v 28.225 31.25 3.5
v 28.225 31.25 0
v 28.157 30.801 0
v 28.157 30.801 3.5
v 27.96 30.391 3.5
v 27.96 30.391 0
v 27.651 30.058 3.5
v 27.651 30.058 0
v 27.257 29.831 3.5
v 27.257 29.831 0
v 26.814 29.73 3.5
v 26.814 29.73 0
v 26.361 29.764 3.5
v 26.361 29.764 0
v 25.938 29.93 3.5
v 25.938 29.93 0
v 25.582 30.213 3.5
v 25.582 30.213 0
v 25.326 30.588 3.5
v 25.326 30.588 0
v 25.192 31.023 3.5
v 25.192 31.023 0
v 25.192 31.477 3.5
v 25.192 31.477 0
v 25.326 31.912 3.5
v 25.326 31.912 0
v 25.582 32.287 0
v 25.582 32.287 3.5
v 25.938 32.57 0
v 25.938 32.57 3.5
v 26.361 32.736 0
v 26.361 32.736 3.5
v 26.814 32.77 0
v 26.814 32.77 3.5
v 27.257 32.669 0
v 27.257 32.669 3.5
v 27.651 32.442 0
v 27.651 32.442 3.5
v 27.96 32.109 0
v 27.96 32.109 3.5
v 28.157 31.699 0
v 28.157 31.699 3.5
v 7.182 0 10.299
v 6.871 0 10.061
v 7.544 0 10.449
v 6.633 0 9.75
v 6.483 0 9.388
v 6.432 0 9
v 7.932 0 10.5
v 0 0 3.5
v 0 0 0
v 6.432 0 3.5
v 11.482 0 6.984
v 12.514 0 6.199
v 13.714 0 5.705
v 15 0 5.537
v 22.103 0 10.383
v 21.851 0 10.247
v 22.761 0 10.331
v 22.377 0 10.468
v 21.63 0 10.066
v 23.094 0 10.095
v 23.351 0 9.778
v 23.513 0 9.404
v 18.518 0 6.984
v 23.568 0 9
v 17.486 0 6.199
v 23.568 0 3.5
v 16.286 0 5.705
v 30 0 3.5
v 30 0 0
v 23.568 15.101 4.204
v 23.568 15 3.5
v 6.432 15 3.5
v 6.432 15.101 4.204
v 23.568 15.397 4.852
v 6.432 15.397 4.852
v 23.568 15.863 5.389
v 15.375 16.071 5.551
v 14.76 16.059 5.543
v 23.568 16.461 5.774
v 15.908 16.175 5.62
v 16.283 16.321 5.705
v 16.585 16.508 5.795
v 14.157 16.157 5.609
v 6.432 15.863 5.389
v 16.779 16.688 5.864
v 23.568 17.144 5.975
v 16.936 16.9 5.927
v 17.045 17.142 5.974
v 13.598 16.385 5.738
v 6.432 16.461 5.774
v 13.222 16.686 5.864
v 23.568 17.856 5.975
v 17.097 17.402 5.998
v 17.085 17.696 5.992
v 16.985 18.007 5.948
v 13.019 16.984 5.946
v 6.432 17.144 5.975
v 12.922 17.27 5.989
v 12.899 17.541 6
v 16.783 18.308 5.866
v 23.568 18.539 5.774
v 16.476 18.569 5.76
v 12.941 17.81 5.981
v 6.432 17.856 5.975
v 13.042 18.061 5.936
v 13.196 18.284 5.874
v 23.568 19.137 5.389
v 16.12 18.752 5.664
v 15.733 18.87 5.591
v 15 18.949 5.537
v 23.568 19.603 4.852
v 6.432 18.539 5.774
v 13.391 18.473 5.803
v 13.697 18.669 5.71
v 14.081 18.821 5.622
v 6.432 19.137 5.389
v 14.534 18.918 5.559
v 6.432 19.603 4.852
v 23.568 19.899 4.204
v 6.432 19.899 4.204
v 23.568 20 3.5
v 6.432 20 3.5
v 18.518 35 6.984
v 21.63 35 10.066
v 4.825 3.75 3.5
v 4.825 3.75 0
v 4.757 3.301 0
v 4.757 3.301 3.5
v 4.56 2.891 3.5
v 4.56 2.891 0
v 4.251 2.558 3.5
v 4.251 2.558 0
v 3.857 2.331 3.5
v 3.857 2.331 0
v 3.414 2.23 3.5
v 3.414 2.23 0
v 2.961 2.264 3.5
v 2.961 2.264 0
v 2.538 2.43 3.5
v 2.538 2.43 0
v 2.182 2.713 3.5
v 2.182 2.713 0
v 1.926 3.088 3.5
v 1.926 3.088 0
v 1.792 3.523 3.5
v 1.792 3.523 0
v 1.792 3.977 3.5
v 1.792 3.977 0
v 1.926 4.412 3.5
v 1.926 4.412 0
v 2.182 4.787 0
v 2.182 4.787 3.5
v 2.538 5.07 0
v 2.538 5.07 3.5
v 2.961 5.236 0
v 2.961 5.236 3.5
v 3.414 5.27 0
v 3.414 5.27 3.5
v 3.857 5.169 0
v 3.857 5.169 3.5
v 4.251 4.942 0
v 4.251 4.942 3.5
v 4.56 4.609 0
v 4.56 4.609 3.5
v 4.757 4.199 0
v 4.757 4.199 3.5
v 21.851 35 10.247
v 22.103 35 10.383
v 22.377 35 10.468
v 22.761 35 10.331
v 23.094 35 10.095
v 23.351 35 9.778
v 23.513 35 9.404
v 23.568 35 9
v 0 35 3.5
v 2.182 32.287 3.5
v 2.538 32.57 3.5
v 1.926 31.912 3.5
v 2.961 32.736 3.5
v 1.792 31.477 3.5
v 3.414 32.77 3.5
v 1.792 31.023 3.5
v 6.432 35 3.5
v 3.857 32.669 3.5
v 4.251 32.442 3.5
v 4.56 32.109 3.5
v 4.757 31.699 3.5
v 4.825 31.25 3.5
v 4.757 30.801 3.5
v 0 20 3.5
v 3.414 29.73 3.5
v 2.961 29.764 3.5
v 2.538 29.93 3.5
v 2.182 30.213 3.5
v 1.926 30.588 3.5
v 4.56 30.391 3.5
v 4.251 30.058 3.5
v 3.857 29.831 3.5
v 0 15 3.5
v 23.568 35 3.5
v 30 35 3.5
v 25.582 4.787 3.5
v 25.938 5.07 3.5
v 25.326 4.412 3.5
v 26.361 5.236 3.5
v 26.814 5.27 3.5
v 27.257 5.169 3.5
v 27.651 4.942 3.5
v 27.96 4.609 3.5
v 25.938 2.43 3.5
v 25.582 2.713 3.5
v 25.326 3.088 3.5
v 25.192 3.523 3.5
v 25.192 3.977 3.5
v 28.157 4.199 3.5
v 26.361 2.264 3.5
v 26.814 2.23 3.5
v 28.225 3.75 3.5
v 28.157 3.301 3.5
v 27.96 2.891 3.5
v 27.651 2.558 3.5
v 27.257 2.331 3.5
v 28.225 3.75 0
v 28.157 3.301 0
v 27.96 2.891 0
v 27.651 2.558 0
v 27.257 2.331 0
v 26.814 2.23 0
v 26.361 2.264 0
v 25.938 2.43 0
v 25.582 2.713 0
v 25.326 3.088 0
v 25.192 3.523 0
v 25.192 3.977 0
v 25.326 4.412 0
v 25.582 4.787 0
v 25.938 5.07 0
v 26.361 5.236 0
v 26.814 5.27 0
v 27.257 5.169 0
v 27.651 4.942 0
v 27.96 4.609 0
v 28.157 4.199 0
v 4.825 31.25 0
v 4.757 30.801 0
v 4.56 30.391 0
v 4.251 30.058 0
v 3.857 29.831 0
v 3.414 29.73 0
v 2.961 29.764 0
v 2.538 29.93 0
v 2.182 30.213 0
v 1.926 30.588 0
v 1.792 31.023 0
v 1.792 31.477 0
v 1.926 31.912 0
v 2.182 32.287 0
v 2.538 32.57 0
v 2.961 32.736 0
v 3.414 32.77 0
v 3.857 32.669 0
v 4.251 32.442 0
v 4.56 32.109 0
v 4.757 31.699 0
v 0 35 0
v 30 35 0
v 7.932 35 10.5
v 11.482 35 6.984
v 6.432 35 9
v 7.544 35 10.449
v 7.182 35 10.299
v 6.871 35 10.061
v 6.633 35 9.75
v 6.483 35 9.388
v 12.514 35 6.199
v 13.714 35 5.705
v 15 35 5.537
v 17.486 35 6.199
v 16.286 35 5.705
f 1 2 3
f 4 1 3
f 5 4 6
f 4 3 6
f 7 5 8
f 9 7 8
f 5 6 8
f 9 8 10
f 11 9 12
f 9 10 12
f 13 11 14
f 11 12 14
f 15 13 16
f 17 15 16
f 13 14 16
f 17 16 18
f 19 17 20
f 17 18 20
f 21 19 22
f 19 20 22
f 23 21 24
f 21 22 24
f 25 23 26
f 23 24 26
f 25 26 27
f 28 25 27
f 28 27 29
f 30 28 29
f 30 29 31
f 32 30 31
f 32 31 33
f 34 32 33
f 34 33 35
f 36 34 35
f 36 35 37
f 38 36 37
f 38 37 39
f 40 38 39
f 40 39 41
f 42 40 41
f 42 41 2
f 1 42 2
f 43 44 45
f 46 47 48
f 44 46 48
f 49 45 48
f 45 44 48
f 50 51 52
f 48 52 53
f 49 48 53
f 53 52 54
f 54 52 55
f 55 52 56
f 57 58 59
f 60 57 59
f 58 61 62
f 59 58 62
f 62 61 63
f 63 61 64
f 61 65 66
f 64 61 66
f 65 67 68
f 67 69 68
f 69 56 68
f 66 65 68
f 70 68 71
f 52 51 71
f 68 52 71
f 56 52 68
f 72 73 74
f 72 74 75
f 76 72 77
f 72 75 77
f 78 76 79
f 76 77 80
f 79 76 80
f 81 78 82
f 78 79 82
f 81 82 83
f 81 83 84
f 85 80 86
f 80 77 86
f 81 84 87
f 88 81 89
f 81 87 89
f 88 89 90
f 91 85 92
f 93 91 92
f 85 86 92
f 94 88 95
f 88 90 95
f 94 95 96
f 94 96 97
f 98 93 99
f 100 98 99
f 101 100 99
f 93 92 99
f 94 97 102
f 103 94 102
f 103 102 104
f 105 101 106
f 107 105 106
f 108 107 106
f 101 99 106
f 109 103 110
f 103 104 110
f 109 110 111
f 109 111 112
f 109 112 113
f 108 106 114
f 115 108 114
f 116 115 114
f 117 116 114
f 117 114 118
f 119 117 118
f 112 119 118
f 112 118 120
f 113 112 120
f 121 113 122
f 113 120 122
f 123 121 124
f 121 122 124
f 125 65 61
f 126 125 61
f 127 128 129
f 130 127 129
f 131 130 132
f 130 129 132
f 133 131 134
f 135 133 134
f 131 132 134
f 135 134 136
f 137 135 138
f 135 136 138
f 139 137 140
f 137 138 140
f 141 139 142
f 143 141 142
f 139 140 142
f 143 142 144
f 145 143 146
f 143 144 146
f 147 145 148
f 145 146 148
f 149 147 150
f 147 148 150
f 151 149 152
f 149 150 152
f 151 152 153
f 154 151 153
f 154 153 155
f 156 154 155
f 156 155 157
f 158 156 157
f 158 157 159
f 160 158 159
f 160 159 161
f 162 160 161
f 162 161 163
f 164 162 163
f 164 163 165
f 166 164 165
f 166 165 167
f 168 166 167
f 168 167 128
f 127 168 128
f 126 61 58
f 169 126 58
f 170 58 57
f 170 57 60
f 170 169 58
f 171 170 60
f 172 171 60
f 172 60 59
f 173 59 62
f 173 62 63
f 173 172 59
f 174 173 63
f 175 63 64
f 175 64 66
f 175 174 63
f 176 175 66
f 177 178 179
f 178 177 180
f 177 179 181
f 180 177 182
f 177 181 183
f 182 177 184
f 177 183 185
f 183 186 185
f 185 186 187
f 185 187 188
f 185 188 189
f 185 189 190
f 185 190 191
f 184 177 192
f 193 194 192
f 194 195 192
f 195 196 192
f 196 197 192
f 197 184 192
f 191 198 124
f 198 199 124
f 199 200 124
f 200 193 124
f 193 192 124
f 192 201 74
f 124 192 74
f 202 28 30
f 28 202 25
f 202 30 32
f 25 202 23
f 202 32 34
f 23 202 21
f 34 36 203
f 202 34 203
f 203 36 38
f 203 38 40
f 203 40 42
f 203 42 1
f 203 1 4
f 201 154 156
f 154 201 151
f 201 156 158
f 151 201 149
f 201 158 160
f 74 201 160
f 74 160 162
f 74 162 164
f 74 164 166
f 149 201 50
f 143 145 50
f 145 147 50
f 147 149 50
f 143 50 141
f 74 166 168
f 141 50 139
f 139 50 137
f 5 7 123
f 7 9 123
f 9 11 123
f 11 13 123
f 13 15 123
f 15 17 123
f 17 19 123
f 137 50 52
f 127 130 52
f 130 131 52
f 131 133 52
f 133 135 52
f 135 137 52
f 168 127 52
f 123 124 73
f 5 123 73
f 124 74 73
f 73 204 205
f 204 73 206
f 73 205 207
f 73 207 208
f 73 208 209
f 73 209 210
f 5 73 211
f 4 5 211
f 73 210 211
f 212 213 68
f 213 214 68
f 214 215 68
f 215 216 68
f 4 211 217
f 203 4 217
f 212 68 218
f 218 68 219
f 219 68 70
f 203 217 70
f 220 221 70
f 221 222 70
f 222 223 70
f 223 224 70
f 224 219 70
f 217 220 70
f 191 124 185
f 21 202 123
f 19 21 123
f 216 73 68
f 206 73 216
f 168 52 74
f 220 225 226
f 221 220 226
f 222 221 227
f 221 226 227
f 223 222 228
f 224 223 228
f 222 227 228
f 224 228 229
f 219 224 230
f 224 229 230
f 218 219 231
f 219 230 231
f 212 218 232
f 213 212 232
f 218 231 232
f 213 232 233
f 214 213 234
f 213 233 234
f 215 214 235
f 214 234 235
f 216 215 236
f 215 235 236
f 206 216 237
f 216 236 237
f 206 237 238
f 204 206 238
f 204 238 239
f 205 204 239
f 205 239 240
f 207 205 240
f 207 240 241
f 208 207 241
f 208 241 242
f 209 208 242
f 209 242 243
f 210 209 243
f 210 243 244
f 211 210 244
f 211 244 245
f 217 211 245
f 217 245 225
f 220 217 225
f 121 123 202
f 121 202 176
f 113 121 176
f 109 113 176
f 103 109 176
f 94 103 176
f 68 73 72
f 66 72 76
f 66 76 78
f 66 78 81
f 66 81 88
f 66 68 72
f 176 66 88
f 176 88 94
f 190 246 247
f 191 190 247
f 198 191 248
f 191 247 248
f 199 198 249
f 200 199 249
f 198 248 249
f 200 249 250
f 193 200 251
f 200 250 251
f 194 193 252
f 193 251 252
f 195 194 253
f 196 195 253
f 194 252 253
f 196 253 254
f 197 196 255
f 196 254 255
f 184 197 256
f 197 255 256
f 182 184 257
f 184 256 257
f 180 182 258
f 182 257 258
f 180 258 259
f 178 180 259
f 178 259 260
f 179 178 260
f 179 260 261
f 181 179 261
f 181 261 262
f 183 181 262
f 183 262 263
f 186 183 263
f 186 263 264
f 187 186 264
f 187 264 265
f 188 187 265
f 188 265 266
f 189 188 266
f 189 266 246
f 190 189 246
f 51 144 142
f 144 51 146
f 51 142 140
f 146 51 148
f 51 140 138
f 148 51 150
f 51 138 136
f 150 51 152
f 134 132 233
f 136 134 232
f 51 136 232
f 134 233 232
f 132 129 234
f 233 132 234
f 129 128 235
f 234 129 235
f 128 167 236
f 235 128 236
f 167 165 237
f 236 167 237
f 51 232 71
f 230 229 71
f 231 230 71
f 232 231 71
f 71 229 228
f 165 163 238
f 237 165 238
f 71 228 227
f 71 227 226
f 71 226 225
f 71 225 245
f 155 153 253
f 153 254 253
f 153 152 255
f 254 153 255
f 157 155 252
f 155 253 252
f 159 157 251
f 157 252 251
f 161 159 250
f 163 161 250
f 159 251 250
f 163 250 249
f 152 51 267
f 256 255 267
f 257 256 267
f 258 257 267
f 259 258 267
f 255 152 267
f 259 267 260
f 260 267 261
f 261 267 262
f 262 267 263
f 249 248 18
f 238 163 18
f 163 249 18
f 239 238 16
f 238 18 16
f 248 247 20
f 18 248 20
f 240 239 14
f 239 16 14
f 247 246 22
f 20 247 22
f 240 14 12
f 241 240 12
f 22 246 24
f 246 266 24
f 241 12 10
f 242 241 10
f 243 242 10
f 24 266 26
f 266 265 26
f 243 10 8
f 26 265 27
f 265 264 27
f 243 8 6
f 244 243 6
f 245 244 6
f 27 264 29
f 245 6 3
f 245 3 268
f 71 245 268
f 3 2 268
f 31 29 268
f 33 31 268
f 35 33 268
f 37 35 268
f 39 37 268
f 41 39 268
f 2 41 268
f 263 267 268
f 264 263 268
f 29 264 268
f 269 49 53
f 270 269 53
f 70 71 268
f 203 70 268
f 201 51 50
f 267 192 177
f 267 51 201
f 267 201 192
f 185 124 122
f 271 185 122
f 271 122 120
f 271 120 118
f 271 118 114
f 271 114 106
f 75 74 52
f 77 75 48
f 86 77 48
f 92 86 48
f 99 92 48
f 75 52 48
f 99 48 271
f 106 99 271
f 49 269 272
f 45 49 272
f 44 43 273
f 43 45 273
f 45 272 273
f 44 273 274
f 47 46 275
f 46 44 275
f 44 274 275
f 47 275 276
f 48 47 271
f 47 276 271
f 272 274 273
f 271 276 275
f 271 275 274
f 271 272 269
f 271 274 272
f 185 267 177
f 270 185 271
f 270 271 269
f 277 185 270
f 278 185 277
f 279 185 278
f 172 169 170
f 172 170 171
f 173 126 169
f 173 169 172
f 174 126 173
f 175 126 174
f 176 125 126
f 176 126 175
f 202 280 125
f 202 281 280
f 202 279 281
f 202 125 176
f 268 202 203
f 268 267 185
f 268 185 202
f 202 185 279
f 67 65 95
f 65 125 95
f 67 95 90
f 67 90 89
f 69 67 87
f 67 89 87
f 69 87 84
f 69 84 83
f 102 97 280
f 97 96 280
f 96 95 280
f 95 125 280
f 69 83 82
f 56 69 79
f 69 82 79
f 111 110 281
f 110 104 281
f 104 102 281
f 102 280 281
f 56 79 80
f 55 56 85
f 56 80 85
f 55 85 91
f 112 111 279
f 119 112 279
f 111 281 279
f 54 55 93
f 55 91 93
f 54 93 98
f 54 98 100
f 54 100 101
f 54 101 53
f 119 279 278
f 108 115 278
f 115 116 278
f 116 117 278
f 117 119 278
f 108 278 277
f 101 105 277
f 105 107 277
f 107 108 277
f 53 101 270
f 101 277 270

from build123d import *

# Parameters (mm, degrees)
F0_W         = 30
F0_H         = 35
F1_DEPTH     = 13
F2_W         = 3.9074438825
F2_H         = 9.5
F3_DEPTH     = 35.001
F4_W         = 2.524356873
F4_H         = 7
F5_DEPTH     = 35.001
F6_R         = 5
F8_DEPTH     = 30.001
F9_R         = 1.5246036127
F10_DEPTH    = 10.501
F11_T1_DEPTH = 42.5
F11_T3_DEPTH = 38.085325067


# Not quite as in the source:
# - a fillet or chamfer that OpenCascade refuses, or shapes differently, is made with other operations: its cross-section is extruded or revolved along the edge and cut away or added


with BuildPart() as f1:
    # F0 (on Top) → F1 (new body)
    with BuildSketch(Plane.XY):
        with Locations((15, 17.5)):
            Rectangle(F0_W, F0_H)
    extrude(amount=F1_DEPTH)

    # F2 (on face) → F3 (cut, through all)
    with BuildSketch(Plane.XZ):
        with Locations((1.9537219413, 8.25)):
            Rectangle(F2_W, F2_H)
        Polygon((15, 13), (5.4074438825, 13), (15, 3.5), (24.5925561175, 13), align=None)
        with Locations((28.0462780587, 8.25)):
            Rectangle(F2_W, F2_H)
    extrude(amount=-F3_DEPTH, mode=Mode.SUBTRACT)

    # F4 (on face) → F5 (cut, through all)
    with BuildSketch(Plane.XZ):
        Polygon((6.4318007555, 10.5), (7.9318007555, 10.5), (5.4074438825, 13), (3.9074438825, 13), (3.9074438825, 10.5), align=None)
        Polygon((23.5681992445, 10.5), (26.0925561175, 10.5), (26.0925561175, 13), (24.5925561175, 13), (22.0681992445, 10.5), align=None)
        with Locations((5.169622319, 7)):
            Rectangle(F4_W, F4_H)
        with Locations((24.830377681, 7)):
            Rectangle(F4_W, F4_H)
    extrude(amount=-F5_DEPTH, mode=Mode.SUBTRACT)

    # F6
    f6_edges = [f1.edges().sort_by_distance(p)[0] for p in [
        (15, 17.5, 3.5),
    ]]
    fillet(f6_edges, radius=F6_R)

    # F7 (on face) → F8 (cut, through all)
    with BuildSketch(Plane(origin=(0, 0, 0), x_dir=(0, -1, 0), z_dir=(-1, 0, 0))):
        with BuildLine():
            ThreePointArc((-15, 3.5), (-17.5, 6), (-20, 3.5))
            Line((-20, 3.5), (-15, 3.5))
        make_face()
    extrude(amount=-F8_DEPTH, mode=Mode.SUBTRACT)

    # F9 (on face) → F10 (cut, through all)
    with BuildSketch(Plane(origin=(0, 0, 0), x_dir=(1, 0, 0), z_dir=(0, 0, -1))):
        with Locations((3.3, -3.75)):
            Circle(F9_R)
        with Locations((26.7, -3.75)):
            Circle(F9_R)
        with Locations((3.3, -31.25)):
            Circle(F9_R)
        with Locations((26.7, -31.25)):
            Circle(F9_R)
    extrude(amount=-F10_DEPTH, mode=Mode.SUBTRACT)

    # F11: fillet of radius 1.5 on 3 edges, made by hand

    # F11_s2 → F11_t1 (cut)
    with BuildSketch(Plane.XZ.offset(-38.75)):
        with BuildLine():
            ThreePointArc((7.9318007555, 10.5), (6.8711405838, 10.0606601718), (6.4318007555, 9))
            Line((6.4318007555, 9), (6.4318007555, 10.5))
            Line((6.4318007555, 10.5), (7.9318007555, 10.5))
        make_face()
        with BuildLine():
            ThreePointArc((22.0681992445, 10.5), (23.1288594162, 10.0606601718), (23.5681992445, 9))
            Line((23.5681992445, 9), (23.5681992445, 10.5))
            Line((23.5681992445, 10.5), (22.0681992445, 10.5))
        make_face()
    extrude(amount=F11_T1_DEPTH, mode=Mode.SUBTRACT)

    # F11_s4 → F11_t3 (cut)
    with BuildSketch(Plane.XZ.offset(-36.5426625335)):
        with BuildLine():
            ThreePointArc((21.6297583139, 10.0657894737), (22.1145998252, 10.3872065835), (22.6852642579, 10.5))
            Line((22.6852642579, 10.5), (22.0681992445, 10.5))
            Line((22.0681992445, 10.5), (21.6297583139, 10.0657894737))
        make_face()
    extrude(amount=F11_T3_DEPTH, mode=Mode.SUBTRACT)


solid = f1.part
